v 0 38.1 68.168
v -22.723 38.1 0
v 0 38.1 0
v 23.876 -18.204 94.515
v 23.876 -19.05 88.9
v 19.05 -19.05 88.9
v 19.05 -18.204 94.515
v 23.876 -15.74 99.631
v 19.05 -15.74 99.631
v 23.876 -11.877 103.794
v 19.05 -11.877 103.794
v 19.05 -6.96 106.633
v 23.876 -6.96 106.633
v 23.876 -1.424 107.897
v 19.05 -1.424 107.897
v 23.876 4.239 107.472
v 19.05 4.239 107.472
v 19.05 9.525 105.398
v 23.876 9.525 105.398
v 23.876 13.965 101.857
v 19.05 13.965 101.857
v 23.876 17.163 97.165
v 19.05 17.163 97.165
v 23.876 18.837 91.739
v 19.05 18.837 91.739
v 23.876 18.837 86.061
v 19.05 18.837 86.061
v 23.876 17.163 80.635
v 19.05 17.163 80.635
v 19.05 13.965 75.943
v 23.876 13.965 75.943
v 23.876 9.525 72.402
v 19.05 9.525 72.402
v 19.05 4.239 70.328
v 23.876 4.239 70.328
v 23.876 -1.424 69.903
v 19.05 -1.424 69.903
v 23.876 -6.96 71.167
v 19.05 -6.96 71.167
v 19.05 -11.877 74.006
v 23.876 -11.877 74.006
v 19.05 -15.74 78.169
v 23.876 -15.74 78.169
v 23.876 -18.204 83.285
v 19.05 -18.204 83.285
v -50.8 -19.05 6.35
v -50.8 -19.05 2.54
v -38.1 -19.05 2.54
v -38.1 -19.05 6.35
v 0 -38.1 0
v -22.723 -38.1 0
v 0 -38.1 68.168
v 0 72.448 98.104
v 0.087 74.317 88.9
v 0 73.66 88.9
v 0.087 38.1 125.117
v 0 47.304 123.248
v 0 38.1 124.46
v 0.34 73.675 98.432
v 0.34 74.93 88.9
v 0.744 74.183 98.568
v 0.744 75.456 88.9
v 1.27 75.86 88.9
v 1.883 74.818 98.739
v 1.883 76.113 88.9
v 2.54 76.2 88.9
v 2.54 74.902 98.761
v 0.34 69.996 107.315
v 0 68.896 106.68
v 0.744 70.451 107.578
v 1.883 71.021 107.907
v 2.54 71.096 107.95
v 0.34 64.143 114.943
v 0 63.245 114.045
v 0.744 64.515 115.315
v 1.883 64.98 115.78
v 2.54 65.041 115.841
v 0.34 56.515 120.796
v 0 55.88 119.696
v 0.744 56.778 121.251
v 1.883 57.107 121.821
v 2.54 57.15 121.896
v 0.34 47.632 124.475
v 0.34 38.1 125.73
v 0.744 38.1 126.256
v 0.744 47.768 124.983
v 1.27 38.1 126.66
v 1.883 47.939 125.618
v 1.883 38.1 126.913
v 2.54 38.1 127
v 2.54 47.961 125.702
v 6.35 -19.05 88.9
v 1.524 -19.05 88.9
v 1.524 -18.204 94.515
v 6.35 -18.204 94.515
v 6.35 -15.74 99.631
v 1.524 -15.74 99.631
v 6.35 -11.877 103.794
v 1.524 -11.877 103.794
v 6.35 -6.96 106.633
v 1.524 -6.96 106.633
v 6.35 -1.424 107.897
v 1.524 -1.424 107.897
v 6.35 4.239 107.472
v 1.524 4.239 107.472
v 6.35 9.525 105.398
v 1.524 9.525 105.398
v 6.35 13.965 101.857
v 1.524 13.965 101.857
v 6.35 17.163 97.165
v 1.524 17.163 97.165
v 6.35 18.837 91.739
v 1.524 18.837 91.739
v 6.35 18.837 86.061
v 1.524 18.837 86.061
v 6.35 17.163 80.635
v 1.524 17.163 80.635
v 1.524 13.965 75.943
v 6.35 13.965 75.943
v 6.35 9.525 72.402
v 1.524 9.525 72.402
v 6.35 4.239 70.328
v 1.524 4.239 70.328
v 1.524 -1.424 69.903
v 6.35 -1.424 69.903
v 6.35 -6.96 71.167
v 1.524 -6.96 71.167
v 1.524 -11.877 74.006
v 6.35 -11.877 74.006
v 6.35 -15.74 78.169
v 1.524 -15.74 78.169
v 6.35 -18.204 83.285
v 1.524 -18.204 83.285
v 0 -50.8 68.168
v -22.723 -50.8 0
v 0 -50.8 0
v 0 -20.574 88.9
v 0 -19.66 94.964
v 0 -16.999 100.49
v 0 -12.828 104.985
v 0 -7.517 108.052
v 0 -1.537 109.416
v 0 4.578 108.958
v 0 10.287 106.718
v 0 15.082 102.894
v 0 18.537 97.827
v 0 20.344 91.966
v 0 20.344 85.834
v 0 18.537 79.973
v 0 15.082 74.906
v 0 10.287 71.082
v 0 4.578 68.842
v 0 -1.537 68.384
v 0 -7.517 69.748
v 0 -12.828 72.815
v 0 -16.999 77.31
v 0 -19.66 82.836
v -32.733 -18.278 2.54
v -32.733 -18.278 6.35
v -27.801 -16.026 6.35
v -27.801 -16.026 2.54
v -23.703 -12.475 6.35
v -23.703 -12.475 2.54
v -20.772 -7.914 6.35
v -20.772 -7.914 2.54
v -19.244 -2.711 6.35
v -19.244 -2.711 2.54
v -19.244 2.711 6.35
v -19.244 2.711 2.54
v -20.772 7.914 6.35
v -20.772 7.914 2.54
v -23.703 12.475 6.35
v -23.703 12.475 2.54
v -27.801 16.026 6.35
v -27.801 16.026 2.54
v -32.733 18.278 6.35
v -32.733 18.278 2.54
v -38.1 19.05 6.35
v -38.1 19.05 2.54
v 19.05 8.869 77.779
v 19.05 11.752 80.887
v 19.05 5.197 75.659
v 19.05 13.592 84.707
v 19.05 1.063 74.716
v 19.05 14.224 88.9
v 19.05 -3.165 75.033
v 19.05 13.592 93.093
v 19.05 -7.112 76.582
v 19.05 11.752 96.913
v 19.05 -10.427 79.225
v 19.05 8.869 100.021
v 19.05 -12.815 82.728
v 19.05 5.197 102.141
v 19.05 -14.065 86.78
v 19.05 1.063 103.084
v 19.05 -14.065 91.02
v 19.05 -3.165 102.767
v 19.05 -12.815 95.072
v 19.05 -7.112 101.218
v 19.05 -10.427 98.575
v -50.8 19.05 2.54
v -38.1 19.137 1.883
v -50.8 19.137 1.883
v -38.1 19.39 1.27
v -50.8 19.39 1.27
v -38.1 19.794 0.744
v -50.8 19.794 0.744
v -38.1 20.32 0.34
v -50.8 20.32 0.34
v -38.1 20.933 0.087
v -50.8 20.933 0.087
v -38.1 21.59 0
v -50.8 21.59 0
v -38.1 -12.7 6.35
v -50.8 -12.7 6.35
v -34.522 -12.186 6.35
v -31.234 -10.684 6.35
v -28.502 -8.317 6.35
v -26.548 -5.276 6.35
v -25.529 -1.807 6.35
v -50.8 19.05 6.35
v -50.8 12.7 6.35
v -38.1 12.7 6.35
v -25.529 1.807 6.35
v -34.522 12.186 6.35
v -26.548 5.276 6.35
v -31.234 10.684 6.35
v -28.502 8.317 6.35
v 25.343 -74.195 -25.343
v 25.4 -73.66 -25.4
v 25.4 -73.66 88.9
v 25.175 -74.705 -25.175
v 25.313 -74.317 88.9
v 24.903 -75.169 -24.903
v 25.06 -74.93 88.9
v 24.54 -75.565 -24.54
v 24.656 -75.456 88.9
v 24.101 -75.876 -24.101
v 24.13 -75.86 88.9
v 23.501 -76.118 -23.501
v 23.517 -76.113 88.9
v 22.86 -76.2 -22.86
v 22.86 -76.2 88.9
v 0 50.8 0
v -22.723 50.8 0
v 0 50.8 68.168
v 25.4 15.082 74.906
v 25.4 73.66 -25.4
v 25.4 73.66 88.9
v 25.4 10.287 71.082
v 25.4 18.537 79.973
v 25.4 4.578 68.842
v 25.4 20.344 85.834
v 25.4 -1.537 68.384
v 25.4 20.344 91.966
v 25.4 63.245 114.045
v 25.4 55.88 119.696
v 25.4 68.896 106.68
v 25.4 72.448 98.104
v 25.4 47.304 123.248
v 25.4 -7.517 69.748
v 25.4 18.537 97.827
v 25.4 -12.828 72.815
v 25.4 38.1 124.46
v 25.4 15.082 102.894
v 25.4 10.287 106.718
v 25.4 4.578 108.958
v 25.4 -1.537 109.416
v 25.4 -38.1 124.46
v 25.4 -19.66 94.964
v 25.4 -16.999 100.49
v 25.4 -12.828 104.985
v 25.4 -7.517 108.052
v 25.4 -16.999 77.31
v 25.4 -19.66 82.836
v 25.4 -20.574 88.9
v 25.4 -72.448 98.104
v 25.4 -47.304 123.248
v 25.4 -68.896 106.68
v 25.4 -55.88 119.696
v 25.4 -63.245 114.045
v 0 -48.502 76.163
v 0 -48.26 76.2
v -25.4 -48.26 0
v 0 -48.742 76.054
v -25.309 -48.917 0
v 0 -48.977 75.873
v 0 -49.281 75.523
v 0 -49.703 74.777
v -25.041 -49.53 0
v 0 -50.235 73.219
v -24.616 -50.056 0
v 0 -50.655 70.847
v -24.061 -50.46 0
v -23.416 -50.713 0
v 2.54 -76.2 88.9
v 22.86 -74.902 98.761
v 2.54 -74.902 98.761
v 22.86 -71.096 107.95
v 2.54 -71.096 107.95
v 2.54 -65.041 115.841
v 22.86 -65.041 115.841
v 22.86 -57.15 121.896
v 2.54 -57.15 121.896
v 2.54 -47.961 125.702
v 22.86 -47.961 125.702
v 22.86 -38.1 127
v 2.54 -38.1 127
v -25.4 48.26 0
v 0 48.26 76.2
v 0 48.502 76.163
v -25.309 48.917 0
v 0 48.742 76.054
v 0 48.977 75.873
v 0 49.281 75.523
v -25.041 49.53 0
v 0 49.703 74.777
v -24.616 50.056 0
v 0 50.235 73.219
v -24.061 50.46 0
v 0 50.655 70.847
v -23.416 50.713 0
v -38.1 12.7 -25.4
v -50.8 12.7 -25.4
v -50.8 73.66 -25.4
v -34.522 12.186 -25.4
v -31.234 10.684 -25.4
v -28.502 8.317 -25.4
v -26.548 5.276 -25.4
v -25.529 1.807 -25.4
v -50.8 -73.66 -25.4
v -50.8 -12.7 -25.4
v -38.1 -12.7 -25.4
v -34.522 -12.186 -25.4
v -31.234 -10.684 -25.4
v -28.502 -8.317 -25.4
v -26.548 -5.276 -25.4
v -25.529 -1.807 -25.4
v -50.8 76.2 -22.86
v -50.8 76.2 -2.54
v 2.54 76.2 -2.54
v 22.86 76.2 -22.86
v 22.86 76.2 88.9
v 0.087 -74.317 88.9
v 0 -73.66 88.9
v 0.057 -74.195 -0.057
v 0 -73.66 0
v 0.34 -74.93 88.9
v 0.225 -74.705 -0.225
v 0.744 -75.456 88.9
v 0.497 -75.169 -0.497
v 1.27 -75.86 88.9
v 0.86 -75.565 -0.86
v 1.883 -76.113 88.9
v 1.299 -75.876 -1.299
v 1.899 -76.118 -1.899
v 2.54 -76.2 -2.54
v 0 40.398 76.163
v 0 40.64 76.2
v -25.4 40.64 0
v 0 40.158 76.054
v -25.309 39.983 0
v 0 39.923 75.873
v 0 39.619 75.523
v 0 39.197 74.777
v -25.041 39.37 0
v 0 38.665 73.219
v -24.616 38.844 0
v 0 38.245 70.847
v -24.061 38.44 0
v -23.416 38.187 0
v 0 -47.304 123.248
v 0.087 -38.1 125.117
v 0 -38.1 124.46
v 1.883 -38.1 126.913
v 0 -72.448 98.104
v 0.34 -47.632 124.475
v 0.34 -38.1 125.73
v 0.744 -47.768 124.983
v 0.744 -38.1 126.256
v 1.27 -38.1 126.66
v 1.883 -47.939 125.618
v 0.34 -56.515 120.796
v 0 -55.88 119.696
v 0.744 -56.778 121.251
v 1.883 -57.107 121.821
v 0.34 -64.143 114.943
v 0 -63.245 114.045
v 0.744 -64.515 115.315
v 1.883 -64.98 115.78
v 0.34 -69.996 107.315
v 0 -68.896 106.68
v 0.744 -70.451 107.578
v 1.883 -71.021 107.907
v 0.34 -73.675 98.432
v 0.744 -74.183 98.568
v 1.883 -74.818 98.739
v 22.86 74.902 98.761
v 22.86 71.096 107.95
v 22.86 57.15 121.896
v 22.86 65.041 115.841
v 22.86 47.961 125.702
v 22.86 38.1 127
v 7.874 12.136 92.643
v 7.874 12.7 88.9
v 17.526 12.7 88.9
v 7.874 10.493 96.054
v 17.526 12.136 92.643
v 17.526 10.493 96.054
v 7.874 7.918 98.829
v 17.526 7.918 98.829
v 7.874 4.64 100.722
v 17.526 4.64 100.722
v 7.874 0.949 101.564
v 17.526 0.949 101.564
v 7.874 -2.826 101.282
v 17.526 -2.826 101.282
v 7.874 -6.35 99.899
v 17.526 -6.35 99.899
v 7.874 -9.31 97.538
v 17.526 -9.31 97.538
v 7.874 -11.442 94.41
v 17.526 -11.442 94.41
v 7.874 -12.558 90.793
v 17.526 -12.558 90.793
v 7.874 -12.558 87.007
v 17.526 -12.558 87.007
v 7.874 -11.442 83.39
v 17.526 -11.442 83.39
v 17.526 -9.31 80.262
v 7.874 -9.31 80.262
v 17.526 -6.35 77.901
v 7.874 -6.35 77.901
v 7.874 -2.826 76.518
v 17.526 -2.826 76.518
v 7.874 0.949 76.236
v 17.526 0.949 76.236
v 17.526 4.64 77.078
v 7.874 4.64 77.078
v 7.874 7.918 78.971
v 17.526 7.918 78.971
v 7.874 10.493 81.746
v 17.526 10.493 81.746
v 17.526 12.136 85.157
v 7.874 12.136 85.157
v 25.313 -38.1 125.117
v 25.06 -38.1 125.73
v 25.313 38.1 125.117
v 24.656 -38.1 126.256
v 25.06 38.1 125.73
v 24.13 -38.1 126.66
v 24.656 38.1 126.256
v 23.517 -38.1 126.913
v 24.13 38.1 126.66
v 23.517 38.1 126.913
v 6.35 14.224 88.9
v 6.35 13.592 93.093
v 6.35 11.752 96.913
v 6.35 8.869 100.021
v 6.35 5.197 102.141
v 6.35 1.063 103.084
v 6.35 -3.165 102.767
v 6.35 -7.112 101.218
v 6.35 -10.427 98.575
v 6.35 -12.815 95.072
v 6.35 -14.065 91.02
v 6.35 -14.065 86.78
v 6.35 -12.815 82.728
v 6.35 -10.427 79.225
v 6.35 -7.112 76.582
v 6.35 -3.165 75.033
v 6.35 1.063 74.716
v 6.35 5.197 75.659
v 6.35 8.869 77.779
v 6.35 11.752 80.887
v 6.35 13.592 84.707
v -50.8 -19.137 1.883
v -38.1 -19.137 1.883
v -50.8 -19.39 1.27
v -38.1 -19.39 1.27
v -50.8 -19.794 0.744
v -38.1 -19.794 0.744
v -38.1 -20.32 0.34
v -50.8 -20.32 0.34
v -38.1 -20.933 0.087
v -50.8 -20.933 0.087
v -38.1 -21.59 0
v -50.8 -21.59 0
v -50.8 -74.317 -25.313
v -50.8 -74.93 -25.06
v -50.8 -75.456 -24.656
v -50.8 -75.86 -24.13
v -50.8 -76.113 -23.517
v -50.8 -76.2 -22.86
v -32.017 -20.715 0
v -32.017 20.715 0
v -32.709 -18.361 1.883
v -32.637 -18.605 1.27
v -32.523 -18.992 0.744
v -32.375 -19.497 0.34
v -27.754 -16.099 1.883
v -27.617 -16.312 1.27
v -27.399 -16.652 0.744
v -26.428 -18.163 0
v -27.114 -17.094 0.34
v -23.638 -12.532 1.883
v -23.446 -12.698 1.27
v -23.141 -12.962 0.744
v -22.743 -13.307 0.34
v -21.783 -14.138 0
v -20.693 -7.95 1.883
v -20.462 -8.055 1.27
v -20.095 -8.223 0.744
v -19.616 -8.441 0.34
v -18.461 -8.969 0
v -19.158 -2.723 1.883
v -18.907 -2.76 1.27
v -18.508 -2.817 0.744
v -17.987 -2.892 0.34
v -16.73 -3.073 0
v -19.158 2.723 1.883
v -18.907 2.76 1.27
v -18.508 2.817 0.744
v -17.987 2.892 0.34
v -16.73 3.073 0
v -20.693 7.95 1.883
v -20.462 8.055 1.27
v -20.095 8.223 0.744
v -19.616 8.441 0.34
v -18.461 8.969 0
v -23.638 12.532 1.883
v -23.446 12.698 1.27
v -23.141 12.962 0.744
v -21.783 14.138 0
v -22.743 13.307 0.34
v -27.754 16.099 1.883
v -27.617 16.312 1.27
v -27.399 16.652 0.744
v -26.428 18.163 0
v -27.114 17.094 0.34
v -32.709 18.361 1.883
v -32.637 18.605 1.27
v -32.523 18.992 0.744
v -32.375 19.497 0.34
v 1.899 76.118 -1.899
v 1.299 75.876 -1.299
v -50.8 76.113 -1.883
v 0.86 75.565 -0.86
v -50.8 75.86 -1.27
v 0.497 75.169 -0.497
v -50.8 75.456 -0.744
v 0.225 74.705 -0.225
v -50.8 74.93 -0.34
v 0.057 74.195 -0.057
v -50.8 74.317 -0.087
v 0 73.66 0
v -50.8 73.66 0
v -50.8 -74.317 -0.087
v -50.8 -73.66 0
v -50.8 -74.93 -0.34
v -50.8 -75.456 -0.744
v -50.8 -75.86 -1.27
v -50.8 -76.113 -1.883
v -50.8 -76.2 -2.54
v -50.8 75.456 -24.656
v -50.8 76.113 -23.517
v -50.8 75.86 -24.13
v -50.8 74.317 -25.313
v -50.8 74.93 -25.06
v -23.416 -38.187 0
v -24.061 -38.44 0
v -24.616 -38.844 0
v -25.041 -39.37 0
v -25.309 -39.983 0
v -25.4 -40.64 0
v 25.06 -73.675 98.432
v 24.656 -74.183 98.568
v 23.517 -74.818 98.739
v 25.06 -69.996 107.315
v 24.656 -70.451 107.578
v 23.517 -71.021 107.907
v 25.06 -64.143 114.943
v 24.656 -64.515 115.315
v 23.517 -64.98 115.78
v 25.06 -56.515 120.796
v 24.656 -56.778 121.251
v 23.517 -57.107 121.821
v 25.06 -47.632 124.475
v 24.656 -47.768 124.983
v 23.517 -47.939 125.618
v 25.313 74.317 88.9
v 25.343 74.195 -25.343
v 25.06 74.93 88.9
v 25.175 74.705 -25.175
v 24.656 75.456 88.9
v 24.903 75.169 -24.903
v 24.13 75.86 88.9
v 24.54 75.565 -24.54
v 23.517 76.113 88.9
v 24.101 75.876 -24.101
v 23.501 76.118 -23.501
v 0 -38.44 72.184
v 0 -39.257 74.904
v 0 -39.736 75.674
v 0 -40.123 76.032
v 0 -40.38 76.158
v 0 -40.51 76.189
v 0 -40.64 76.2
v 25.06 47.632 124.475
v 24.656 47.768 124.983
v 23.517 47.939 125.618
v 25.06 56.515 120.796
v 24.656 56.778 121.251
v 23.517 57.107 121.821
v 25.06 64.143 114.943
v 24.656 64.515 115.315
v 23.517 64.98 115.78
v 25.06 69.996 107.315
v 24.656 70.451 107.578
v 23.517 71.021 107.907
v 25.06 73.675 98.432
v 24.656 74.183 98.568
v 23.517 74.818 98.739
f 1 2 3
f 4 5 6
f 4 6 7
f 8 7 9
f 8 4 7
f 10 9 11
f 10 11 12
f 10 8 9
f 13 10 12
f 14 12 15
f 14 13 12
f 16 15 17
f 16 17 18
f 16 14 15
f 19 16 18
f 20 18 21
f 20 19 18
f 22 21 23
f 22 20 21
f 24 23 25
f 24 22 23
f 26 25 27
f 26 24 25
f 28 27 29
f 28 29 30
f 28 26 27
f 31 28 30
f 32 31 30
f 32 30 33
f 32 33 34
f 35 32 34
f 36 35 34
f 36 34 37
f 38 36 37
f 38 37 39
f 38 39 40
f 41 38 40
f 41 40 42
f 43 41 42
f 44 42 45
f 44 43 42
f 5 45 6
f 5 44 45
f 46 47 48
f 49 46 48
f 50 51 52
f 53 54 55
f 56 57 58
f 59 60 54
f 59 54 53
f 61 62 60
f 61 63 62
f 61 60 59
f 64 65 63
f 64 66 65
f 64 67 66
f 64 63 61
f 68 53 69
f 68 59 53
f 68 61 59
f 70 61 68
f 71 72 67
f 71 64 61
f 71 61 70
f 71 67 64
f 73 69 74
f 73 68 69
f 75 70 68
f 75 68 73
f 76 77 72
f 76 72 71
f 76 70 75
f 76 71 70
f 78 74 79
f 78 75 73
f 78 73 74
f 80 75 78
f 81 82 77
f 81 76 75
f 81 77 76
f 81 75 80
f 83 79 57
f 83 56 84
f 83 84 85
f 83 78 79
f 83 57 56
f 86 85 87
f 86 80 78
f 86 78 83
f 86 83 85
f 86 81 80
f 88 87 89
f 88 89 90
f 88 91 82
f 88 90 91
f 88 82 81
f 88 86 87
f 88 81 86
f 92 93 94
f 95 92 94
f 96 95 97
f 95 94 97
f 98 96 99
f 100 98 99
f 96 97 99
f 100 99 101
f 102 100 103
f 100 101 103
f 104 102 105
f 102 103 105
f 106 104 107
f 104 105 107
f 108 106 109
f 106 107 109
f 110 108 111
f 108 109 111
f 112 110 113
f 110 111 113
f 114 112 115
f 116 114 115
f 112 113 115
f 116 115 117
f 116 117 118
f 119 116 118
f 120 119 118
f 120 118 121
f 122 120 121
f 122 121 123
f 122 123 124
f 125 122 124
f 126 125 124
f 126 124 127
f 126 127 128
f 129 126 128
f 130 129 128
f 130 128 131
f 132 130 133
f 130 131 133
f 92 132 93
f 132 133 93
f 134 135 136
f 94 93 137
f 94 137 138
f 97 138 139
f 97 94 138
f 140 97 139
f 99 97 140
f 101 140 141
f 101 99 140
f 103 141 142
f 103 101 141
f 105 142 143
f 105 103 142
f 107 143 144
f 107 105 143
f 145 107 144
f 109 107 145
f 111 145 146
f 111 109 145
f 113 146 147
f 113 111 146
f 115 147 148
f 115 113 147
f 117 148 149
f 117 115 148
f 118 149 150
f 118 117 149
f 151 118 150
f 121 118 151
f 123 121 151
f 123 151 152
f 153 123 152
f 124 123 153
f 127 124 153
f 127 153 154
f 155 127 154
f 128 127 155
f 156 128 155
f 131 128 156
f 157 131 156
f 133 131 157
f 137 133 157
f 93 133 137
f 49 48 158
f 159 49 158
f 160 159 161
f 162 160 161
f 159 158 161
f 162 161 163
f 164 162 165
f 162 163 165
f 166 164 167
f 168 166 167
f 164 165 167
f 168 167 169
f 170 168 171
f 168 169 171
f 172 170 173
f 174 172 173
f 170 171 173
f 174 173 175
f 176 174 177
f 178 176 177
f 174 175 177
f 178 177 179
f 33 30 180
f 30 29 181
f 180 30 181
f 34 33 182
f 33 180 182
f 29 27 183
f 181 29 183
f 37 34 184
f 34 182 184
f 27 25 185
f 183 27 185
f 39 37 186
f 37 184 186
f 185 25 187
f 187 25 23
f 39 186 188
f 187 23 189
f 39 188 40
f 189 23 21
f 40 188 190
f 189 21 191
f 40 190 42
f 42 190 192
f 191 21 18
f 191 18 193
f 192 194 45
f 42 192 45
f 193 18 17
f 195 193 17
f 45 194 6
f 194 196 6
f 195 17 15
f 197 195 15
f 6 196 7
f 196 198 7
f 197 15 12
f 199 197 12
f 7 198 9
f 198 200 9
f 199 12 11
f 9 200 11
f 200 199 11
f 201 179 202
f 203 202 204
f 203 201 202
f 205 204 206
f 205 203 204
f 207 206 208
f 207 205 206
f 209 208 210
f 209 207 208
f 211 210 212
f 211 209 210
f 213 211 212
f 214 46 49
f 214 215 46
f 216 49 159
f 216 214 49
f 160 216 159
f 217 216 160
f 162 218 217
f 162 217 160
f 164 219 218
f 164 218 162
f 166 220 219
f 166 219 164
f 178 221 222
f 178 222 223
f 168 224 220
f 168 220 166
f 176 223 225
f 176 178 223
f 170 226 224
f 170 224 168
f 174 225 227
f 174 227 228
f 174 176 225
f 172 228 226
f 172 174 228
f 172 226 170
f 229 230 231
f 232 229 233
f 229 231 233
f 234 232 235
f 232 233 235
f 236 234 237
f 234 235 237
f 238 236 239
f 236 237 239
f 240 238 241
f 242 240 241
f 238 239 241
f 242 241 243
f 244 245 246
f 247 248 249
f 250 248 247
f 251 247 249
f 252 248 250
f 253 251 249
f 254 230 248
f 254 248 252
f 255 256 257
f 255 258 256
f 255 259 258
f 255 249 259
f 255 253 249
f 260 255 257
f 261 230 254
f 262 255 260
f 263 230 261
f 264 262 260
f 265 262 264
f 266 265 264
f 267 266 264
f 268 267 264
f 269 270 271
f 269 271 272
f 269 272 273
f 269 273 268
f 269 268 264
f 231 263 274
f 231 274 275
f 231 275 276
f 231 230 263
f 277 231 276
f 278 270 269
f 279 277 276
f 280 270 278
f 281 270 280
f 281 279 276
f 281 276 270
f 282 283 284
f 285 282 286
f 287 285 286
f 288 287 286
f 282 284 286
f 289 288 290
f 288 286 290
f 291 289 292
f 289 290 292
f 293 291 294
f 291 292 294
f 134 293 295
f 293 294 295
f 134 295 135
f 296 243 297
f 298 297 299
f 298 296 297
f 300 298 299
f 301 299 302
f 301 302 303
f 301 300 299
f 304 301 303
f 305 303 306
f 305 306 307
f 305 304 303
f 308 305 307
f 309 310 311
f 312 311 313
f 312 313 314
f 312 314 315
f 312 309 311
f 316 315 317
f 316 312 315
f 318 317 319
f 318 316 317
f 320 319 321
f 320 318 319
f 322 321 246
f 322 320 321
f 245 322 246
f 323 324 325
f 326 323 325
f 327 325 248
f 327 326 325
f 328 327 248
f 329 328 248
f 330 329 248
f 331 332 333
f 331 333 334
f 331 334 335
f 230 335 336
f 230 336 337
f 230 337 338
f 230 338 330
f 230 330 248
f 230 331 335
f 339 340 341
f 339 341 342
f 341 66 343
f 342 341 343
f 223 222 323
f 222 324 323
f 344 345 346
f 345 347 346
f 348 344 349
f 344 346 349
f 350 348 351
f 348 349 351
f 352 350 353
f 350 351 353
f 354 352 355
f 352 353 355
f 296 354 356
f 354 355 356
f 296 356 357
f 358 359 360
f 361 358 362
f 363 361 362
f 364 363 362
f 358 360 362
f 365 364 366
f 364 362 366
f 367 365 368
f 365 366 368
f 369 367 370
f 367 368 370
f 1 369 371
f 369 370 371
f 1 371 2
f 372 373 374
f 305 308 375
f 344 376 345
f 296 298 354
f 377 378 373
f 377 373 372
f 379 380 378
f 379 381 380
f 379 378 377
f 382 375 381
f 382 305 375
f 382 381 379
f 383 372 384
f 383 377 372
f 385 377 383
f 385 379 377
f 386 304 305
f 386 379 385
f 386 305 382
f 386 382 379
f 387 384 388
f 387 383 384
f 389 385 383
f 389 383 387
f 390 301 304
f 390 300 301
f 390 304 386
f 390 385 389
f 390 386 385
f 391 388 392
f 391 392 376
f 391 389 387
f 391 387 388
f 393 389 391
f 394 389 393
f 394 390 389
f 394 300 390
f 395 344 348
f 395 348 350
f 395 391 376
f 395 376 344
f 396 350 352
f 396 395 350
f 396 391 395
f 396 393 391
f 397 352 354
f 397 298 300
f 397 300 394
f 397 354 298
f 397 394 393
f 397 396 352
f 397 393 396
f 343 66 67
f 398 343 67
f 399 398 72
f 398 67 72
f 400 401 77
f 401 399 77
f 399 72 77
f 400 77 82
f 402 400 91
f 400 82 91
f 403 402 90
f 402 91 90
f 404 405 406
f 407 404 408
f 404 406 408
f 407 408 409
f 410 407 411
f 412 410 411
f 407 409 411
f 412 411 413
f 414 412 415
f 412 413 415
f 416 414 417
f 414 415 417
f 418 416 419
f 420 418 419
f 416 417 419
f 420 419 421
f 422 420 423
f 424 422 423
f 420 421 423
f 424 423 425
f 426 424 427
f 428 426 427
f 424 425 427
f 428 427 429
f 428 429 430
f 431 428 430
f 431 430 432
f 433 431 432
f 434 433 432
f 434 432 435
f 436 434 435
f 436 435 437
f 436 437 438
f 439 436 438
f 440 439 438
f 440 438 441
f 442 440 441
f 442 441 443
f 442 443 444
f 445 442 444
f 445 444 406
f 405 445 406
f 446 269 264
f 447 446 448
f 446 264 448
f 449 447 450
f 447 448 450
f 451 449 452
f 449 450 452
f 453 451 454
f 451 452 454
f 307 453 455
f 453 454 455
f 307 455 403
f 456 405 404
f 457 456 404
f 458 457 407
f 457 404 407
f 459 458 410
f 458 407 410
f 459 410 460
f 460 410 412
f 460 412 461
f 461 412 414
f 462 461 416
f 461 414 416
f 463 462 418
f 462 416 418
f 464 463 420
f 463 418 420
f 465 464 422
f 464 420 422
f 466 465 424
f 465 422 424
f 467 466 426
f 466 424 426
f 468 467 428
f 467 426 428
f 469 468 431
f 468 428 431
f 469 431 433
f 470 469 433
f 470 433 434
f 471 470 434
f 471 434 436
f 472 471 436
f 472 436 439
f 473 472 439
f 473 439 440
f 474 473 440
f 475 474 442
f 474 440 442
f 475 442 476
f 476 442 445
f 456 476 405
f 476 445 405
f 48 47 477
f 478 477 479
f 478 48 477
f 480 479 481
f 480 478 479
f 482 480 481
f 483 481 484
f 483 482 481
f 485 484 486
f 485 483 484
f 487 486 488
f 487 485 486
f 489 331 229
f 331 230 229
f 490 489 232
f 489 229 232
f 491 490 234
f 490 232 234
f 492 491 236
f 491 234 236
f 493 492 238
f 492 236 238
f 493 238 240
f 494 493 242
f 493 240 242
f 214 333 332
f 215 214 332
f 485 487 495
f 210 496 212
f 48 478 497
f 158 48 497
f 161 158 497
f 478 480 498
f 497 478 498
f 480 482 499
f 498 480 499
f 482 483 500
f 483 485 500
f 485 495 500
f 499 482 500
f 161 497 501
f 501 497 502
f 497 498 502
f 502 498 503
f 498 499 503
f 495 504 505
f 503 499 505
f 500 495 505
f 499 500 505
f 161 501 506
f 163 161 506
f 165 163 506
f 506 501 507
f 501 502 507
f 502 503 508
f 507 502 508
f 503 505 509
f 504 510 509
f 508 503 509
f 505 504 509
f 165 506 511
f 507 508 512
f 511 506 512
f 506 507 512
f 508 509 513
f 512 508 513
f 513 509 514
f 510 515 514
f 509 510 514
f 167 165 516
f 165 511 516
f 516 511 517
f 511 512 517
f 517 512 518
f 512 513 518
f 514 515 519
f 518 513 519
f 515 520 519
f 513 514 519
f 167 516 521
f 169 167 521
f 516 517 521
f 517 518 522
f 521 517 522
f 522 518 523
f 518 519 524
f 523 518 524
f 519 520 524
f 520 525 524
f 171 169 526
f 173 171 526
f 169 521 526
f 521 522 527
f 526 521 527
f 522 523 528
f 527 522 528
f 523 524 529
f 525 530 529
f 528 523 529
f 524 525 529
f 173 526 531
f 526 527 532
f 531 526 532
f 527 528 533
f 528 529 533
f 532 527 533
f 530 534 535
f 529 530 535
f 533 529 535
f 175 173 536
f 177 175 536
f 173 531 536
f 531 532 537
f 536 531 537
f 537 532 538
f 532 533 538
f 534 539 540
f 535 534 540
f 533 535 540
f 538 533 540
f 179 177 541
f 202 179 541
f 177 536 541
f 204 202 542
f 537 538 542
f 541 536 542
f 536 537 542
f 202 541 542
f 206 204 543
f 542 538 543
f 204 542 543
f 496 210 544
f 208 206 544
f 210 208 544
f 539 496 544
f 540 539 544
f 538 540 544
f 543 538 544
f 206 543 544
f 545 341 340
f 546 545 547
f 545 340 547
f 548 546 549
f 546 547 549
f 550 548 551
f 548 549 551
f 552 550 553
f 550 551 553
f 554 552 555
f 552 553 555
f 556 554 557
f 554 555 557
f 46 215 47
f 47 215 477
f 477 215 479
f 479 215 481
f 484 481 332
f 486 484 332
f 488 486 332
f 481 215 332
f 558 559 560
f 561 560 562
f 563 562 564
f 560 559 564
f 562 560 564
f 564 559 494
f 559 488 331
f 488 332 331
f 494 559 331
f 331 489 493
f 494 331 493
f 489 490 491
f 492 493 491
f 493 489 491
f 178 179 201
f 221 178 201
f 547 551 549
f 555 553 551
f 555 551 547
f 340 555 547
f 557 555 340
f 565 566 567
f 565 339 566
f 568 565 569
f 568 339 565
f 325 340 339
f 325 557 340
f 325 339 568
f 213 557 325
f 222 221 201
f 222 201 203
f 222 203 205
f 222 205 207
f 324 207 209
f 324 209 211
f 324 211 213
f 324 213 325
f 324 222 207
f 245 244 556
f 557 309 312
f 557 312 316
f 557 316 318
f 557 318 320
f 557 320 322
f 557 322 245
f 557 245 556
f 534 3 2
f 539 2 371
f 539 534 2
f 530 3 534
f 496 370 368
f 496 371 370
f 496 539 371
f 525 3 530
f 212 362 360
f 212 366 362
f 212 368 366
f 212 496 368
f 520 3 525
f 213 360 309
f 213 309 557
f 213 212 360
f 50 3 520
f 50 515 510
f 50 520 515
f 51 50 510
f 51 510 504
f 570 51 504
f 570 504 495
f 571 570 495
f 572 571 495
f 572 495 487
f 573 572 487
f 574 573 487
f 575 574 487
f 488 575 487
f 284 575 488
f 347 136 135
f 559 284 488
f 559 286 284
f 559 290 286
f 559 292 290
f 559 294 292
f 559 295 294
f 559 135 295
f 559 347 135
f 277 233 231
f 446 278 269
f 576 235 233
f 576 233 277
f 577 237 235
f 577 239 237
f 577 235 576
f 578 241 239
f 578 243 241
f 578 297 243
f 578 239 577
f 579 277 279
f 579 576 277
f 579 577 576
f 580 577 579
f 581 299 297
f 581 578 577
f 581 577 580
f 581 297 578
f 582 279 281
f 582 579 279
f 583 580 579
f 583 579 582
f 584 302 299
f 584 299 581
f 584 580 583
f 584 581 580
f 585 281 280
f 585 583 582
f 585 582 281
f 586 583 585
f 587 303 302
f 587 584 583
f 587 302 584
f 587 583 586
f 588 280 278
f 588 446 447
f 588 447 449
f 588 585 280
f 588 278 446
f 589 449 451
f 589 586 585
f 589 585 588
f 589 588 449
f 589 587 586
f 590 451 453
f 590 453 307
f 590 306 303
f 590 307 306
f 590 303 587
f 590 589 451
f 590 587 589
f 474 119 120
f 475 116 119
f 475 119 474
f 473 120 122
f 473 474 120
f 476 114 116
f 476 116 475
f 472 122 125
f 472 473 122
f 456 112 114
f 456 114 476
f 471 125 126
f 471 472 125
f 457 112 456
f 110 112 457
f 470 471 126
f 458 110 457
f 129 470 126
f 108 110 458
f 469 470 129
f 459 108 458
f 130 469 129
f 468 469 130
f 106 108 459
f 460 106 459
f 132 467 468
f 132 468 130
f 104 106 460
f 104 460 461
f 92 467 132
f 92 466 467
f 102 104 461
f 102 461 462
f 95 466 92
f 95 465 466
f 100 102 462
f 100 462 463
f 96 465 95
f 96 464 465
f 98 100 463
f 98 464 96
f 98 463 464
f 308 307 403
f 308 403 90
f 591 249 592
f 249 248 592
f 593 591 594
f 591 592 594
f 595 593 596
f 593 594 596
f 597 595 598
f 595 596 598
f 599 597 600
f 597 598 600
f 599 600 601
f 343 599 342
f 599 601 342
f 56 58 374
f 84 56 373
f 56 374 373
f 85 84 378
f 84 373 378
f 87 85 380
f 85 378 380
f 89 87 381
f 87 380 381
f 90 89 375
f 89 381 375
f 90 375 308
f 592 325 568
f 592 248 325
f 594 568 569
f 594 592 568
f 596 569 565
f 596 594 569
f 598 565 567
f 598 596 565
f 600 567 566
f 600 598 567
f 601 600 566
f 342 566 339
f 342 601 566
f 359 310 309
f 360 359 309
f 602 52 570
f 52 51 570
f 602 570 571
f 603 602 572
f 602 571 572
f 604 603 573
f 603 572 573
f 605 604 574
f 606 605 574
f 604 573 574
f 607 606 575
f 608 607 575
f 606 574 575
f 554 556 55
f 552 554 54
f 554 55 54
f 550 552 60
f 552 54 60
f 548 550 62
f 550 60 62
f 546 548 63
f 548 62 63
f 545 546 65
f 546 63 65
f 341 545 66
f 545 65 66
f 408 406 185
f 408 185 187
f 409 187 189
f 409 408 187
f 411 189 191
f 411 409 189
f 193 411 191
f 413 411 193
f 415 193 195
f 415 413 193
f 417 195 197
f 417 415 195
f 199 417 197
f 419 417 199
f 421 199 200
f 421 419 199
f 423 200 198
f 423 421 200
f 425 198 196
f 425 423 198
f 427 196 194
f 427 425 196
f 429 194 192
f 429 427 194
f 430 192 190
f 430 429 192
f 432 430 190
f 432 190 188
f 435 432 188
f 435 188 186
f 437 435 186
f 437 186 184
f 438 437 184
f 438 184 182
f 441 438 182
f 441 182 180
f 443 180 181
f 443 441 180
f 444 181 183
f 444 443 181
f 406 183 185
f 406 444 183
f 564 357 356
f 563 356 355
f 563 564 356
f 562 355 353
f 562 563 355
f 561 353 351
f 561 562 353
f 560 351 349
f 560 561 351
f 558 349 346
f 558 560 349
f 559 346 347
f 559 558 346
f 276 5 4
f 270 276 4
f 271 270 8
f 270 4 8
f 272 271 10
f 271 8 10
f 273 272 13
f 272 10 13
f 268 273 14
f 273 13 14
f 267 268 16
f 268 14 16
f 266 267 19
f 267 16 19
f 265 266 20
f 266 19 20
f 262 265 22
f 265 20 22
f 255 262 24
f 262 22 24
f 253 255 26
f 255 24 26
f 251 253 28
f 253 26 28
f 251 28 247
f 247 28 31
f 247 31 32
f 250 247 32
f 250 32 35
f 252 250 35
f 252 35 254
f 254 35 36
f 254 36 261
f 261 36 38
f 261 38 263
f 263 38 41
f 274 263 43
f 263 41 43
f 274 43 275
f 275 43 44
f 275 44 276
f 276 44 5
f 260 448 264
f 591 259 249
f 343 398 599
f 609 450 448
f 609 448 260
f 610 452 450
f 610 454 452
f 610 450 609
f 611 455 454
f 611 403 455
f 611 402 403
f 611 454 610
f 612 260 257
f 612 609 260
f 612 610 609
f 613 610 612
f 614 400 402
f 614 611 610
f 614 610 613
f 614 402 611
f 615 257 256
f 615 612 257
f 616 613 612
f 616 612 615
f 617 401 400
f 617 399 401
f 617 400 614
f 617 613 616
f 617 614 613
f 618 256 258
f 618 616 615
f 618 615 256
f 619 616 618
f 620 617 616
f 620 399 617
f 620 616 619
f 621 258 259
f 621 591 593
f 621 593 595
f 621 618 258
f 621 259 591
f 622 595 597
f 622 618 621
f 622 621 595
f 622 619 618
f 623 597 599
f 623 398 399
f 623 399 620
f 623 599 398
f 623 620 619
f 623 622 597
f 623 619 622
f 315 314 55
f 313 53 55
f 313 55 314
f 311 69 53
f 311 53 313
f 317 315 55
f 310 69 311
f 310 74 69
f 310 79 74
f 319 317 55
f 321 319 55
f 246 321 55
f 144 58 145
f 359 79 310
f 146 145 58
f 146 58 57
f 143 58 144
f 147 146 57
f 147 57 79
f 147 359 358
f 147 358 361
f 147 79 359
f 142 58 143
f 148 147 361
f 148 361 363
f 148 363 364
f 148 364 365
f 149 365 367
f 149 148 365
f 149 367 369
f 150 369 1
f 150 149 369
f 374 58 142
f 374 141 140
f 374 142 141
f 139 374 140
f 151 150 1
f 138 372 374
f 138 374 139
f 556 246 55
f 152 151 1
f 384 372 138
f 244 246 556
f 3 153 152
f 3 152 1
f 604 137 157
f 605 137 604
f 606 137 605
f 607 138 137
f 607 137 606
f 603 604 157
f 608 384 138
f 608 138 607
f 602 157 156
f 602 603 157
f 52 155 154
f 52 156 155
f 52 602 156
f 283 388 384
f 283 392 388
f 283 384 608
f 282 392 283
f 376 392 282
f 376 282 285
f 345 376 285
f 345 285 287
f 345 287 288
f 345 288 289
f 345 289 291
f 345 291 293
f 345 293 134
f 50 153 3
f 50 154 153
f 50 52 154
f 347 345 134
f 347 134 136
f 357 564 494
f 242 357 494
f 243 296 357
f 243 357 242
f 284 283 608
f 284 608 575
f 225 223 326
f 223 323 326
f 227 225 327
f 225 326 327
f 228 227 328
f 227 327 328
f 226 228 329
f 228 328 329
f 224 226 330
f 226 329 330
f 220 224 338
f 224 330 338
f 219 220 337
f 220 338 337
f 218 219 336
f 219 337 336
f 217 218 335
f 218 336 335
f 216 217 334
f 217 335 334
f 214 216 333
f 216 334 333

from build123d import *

# Parameters (mm, degrees)
F1_DEPTH  = 76.2
F2_R      = 12.7
F3_DEPTH  = 76.201
F5_DEPTH  = 25.401
F7_R      = 19.05
F8_DEPTH  = 6.35
F12_START = -69.85
F12_DEPTH = 12.7
F13_R     = 38.1
F14_SIZE  = 1.524
F16_DEPTH = 6.35
F17_R     = 2.54


# Not quite as in the source:
# - a pattern or mirror of a feature is missing from the dataset's text; its kind, count and spacing are read off the source's solid


with BuildPart() as f1:
    # F0 (on Front) → F1 (new body, symmetric)
    with BuildSketch(Plane.XZ):
        Polygon((0, 0), (-50.8, 0), (-50.8, -25.4), (25.4, -25.4), (25.4, 127), (0, 127), align=None)
    extrude(amount=F1_DEPTH, both=True)

    # F2 (on face) → F3 (cut, through all)
    with BuildSketch(Plane.YZ.offset(25.4)):
        with Locations((0, 88.9)):
            Circle(F2_R)
    extrude(amount=-F3_DEPTH, mode=Mode.SUBTRACT)

    # F4 (on face) → F5 (cut, through all)
    with BuildSketch(Plane.XY):
        with BuildLine():
            Line((-50.8, -12.7), (-38.1, -12.7))
            ThreePointArc((-38.1, -12.7), (-25.4, 0), (-38.1, 12.7))
            Line((-38.1, 12.7), (-50.8, 12.7))
            Line((-50.8, 12.7), (-50.8, -12.7))
        make_face()
    extrude(amount=-F5_DEPTH, mode=Mode.SUBTRACT)

    # F7 (on face) → F8 (cut)
    with BuildSketch(Plane(origin=(0, 0, 0), x_dir=(0, -1, 0), z_dir=(-1, 0, 0))):
        with Locations((0, 88.9)):
            Circle(F7_R)
    f8 = extrude(amount=-F8_DEPTH, mode=Mode.SUBTRACT)

    # F8_copies: F8 across plane
    add(f8.mirror(Plane(origin=(12.7, 0, 0), x_dir=(0, 0, 1), z_dir=(1, 0, 0))), mode=Mode.SUBTRACT)

    # F11 (on offset) → F12 (join)
    with BuildSketch(Plane.XZ.offset(120.65).offset(F12_START)):
        Polygon((0, 0), (0, 76.2), (-25.4, 0), align=None)
    f12 = extrude(amount=-F12_DEPTH)

    # F12_copies: F12 across plane
    add(f12.mirror(Plane.ZX))

    # F13
    f13_edges = [f1.edges().sort_by_distance(p)[0] for p in [
        (12.7, 76.2, 127),
        (12.7, -76.2, 127),
    ]]
    fillet(f13_edges, radius=F13_R)

    # F14
    f14_edges = [f1.edges().sort_by_distance(p)[0] for p in [
        (6.35, -12.7, 88.9),
        (0, 19.05, 88.9),
        (25.4, 19.05, 88.9),
        (19.05, -12.7, 88.9),
    ]]
    chamfer(f14_edges, length=F14_SIZE)

    # F15 (on face) → F16 (join)
    with BuildSketch(Plane.XY):
        with BuildLine():
            Line((-50.8, -19.05), (-38.1, -19.05))
            ThreePointArc((-38.1, -19.05), (-19.05, 0), (-38.1, 19.05))
            Line((-38.1, 19.05), (-50.8, 19.05))
            Line((-50.8, 19.05), (-50.8, 12.7))
            Line((-50.8, 12.7), (-38.1, 12.7))
            ThreePointArc((-38.1, 12.7), (-25.4, 0), (-38.1, -12.7))
            Line((-38.1, -12.7), (-50.8, -12.7))
            Line((-50.8, -12.7), (-50.8, -19.05))
        make_face()
    extrude(amount=F16_DEPTH)

    # F17
    f17_edges = [f1.edges().sort_by_distance(p)[0] for p in [
        (-44.45, 19.05, 0),
        (-12.7, -38.1, 38.1),
        (-12.7, -50.8, 38.1),
        (0, -76.2, 44.45),
        (25.4, -76.2, 31.75),
        (-25.4, -76.2, 0),
        (-12.7, -76.2, -25.4),
        (-25.4, 76.2, 0),
        (-12.7, 76.2, -25.4),
        (25.4, 76.2, 31.75),
        (25.4, 65.040768, 115.840768),
        (25.4, 0, 127),
        (25.4, -65.040768, 115.840768),
        (0, -65.040768, 115.840768),
        (0, 0, 127),
        (0, 65.040768, 115.840768),
        (0, 76.2, 44.45),
        (-12.7, 50.8, 38.1),
        (-12.7, 38.1, 38.1),
        (-44.45, -19.05, 0),
        (-19.05, 0, 0),
    ]]
    fillet(f17_edges, radius=F17_R)


solid = f1.part
